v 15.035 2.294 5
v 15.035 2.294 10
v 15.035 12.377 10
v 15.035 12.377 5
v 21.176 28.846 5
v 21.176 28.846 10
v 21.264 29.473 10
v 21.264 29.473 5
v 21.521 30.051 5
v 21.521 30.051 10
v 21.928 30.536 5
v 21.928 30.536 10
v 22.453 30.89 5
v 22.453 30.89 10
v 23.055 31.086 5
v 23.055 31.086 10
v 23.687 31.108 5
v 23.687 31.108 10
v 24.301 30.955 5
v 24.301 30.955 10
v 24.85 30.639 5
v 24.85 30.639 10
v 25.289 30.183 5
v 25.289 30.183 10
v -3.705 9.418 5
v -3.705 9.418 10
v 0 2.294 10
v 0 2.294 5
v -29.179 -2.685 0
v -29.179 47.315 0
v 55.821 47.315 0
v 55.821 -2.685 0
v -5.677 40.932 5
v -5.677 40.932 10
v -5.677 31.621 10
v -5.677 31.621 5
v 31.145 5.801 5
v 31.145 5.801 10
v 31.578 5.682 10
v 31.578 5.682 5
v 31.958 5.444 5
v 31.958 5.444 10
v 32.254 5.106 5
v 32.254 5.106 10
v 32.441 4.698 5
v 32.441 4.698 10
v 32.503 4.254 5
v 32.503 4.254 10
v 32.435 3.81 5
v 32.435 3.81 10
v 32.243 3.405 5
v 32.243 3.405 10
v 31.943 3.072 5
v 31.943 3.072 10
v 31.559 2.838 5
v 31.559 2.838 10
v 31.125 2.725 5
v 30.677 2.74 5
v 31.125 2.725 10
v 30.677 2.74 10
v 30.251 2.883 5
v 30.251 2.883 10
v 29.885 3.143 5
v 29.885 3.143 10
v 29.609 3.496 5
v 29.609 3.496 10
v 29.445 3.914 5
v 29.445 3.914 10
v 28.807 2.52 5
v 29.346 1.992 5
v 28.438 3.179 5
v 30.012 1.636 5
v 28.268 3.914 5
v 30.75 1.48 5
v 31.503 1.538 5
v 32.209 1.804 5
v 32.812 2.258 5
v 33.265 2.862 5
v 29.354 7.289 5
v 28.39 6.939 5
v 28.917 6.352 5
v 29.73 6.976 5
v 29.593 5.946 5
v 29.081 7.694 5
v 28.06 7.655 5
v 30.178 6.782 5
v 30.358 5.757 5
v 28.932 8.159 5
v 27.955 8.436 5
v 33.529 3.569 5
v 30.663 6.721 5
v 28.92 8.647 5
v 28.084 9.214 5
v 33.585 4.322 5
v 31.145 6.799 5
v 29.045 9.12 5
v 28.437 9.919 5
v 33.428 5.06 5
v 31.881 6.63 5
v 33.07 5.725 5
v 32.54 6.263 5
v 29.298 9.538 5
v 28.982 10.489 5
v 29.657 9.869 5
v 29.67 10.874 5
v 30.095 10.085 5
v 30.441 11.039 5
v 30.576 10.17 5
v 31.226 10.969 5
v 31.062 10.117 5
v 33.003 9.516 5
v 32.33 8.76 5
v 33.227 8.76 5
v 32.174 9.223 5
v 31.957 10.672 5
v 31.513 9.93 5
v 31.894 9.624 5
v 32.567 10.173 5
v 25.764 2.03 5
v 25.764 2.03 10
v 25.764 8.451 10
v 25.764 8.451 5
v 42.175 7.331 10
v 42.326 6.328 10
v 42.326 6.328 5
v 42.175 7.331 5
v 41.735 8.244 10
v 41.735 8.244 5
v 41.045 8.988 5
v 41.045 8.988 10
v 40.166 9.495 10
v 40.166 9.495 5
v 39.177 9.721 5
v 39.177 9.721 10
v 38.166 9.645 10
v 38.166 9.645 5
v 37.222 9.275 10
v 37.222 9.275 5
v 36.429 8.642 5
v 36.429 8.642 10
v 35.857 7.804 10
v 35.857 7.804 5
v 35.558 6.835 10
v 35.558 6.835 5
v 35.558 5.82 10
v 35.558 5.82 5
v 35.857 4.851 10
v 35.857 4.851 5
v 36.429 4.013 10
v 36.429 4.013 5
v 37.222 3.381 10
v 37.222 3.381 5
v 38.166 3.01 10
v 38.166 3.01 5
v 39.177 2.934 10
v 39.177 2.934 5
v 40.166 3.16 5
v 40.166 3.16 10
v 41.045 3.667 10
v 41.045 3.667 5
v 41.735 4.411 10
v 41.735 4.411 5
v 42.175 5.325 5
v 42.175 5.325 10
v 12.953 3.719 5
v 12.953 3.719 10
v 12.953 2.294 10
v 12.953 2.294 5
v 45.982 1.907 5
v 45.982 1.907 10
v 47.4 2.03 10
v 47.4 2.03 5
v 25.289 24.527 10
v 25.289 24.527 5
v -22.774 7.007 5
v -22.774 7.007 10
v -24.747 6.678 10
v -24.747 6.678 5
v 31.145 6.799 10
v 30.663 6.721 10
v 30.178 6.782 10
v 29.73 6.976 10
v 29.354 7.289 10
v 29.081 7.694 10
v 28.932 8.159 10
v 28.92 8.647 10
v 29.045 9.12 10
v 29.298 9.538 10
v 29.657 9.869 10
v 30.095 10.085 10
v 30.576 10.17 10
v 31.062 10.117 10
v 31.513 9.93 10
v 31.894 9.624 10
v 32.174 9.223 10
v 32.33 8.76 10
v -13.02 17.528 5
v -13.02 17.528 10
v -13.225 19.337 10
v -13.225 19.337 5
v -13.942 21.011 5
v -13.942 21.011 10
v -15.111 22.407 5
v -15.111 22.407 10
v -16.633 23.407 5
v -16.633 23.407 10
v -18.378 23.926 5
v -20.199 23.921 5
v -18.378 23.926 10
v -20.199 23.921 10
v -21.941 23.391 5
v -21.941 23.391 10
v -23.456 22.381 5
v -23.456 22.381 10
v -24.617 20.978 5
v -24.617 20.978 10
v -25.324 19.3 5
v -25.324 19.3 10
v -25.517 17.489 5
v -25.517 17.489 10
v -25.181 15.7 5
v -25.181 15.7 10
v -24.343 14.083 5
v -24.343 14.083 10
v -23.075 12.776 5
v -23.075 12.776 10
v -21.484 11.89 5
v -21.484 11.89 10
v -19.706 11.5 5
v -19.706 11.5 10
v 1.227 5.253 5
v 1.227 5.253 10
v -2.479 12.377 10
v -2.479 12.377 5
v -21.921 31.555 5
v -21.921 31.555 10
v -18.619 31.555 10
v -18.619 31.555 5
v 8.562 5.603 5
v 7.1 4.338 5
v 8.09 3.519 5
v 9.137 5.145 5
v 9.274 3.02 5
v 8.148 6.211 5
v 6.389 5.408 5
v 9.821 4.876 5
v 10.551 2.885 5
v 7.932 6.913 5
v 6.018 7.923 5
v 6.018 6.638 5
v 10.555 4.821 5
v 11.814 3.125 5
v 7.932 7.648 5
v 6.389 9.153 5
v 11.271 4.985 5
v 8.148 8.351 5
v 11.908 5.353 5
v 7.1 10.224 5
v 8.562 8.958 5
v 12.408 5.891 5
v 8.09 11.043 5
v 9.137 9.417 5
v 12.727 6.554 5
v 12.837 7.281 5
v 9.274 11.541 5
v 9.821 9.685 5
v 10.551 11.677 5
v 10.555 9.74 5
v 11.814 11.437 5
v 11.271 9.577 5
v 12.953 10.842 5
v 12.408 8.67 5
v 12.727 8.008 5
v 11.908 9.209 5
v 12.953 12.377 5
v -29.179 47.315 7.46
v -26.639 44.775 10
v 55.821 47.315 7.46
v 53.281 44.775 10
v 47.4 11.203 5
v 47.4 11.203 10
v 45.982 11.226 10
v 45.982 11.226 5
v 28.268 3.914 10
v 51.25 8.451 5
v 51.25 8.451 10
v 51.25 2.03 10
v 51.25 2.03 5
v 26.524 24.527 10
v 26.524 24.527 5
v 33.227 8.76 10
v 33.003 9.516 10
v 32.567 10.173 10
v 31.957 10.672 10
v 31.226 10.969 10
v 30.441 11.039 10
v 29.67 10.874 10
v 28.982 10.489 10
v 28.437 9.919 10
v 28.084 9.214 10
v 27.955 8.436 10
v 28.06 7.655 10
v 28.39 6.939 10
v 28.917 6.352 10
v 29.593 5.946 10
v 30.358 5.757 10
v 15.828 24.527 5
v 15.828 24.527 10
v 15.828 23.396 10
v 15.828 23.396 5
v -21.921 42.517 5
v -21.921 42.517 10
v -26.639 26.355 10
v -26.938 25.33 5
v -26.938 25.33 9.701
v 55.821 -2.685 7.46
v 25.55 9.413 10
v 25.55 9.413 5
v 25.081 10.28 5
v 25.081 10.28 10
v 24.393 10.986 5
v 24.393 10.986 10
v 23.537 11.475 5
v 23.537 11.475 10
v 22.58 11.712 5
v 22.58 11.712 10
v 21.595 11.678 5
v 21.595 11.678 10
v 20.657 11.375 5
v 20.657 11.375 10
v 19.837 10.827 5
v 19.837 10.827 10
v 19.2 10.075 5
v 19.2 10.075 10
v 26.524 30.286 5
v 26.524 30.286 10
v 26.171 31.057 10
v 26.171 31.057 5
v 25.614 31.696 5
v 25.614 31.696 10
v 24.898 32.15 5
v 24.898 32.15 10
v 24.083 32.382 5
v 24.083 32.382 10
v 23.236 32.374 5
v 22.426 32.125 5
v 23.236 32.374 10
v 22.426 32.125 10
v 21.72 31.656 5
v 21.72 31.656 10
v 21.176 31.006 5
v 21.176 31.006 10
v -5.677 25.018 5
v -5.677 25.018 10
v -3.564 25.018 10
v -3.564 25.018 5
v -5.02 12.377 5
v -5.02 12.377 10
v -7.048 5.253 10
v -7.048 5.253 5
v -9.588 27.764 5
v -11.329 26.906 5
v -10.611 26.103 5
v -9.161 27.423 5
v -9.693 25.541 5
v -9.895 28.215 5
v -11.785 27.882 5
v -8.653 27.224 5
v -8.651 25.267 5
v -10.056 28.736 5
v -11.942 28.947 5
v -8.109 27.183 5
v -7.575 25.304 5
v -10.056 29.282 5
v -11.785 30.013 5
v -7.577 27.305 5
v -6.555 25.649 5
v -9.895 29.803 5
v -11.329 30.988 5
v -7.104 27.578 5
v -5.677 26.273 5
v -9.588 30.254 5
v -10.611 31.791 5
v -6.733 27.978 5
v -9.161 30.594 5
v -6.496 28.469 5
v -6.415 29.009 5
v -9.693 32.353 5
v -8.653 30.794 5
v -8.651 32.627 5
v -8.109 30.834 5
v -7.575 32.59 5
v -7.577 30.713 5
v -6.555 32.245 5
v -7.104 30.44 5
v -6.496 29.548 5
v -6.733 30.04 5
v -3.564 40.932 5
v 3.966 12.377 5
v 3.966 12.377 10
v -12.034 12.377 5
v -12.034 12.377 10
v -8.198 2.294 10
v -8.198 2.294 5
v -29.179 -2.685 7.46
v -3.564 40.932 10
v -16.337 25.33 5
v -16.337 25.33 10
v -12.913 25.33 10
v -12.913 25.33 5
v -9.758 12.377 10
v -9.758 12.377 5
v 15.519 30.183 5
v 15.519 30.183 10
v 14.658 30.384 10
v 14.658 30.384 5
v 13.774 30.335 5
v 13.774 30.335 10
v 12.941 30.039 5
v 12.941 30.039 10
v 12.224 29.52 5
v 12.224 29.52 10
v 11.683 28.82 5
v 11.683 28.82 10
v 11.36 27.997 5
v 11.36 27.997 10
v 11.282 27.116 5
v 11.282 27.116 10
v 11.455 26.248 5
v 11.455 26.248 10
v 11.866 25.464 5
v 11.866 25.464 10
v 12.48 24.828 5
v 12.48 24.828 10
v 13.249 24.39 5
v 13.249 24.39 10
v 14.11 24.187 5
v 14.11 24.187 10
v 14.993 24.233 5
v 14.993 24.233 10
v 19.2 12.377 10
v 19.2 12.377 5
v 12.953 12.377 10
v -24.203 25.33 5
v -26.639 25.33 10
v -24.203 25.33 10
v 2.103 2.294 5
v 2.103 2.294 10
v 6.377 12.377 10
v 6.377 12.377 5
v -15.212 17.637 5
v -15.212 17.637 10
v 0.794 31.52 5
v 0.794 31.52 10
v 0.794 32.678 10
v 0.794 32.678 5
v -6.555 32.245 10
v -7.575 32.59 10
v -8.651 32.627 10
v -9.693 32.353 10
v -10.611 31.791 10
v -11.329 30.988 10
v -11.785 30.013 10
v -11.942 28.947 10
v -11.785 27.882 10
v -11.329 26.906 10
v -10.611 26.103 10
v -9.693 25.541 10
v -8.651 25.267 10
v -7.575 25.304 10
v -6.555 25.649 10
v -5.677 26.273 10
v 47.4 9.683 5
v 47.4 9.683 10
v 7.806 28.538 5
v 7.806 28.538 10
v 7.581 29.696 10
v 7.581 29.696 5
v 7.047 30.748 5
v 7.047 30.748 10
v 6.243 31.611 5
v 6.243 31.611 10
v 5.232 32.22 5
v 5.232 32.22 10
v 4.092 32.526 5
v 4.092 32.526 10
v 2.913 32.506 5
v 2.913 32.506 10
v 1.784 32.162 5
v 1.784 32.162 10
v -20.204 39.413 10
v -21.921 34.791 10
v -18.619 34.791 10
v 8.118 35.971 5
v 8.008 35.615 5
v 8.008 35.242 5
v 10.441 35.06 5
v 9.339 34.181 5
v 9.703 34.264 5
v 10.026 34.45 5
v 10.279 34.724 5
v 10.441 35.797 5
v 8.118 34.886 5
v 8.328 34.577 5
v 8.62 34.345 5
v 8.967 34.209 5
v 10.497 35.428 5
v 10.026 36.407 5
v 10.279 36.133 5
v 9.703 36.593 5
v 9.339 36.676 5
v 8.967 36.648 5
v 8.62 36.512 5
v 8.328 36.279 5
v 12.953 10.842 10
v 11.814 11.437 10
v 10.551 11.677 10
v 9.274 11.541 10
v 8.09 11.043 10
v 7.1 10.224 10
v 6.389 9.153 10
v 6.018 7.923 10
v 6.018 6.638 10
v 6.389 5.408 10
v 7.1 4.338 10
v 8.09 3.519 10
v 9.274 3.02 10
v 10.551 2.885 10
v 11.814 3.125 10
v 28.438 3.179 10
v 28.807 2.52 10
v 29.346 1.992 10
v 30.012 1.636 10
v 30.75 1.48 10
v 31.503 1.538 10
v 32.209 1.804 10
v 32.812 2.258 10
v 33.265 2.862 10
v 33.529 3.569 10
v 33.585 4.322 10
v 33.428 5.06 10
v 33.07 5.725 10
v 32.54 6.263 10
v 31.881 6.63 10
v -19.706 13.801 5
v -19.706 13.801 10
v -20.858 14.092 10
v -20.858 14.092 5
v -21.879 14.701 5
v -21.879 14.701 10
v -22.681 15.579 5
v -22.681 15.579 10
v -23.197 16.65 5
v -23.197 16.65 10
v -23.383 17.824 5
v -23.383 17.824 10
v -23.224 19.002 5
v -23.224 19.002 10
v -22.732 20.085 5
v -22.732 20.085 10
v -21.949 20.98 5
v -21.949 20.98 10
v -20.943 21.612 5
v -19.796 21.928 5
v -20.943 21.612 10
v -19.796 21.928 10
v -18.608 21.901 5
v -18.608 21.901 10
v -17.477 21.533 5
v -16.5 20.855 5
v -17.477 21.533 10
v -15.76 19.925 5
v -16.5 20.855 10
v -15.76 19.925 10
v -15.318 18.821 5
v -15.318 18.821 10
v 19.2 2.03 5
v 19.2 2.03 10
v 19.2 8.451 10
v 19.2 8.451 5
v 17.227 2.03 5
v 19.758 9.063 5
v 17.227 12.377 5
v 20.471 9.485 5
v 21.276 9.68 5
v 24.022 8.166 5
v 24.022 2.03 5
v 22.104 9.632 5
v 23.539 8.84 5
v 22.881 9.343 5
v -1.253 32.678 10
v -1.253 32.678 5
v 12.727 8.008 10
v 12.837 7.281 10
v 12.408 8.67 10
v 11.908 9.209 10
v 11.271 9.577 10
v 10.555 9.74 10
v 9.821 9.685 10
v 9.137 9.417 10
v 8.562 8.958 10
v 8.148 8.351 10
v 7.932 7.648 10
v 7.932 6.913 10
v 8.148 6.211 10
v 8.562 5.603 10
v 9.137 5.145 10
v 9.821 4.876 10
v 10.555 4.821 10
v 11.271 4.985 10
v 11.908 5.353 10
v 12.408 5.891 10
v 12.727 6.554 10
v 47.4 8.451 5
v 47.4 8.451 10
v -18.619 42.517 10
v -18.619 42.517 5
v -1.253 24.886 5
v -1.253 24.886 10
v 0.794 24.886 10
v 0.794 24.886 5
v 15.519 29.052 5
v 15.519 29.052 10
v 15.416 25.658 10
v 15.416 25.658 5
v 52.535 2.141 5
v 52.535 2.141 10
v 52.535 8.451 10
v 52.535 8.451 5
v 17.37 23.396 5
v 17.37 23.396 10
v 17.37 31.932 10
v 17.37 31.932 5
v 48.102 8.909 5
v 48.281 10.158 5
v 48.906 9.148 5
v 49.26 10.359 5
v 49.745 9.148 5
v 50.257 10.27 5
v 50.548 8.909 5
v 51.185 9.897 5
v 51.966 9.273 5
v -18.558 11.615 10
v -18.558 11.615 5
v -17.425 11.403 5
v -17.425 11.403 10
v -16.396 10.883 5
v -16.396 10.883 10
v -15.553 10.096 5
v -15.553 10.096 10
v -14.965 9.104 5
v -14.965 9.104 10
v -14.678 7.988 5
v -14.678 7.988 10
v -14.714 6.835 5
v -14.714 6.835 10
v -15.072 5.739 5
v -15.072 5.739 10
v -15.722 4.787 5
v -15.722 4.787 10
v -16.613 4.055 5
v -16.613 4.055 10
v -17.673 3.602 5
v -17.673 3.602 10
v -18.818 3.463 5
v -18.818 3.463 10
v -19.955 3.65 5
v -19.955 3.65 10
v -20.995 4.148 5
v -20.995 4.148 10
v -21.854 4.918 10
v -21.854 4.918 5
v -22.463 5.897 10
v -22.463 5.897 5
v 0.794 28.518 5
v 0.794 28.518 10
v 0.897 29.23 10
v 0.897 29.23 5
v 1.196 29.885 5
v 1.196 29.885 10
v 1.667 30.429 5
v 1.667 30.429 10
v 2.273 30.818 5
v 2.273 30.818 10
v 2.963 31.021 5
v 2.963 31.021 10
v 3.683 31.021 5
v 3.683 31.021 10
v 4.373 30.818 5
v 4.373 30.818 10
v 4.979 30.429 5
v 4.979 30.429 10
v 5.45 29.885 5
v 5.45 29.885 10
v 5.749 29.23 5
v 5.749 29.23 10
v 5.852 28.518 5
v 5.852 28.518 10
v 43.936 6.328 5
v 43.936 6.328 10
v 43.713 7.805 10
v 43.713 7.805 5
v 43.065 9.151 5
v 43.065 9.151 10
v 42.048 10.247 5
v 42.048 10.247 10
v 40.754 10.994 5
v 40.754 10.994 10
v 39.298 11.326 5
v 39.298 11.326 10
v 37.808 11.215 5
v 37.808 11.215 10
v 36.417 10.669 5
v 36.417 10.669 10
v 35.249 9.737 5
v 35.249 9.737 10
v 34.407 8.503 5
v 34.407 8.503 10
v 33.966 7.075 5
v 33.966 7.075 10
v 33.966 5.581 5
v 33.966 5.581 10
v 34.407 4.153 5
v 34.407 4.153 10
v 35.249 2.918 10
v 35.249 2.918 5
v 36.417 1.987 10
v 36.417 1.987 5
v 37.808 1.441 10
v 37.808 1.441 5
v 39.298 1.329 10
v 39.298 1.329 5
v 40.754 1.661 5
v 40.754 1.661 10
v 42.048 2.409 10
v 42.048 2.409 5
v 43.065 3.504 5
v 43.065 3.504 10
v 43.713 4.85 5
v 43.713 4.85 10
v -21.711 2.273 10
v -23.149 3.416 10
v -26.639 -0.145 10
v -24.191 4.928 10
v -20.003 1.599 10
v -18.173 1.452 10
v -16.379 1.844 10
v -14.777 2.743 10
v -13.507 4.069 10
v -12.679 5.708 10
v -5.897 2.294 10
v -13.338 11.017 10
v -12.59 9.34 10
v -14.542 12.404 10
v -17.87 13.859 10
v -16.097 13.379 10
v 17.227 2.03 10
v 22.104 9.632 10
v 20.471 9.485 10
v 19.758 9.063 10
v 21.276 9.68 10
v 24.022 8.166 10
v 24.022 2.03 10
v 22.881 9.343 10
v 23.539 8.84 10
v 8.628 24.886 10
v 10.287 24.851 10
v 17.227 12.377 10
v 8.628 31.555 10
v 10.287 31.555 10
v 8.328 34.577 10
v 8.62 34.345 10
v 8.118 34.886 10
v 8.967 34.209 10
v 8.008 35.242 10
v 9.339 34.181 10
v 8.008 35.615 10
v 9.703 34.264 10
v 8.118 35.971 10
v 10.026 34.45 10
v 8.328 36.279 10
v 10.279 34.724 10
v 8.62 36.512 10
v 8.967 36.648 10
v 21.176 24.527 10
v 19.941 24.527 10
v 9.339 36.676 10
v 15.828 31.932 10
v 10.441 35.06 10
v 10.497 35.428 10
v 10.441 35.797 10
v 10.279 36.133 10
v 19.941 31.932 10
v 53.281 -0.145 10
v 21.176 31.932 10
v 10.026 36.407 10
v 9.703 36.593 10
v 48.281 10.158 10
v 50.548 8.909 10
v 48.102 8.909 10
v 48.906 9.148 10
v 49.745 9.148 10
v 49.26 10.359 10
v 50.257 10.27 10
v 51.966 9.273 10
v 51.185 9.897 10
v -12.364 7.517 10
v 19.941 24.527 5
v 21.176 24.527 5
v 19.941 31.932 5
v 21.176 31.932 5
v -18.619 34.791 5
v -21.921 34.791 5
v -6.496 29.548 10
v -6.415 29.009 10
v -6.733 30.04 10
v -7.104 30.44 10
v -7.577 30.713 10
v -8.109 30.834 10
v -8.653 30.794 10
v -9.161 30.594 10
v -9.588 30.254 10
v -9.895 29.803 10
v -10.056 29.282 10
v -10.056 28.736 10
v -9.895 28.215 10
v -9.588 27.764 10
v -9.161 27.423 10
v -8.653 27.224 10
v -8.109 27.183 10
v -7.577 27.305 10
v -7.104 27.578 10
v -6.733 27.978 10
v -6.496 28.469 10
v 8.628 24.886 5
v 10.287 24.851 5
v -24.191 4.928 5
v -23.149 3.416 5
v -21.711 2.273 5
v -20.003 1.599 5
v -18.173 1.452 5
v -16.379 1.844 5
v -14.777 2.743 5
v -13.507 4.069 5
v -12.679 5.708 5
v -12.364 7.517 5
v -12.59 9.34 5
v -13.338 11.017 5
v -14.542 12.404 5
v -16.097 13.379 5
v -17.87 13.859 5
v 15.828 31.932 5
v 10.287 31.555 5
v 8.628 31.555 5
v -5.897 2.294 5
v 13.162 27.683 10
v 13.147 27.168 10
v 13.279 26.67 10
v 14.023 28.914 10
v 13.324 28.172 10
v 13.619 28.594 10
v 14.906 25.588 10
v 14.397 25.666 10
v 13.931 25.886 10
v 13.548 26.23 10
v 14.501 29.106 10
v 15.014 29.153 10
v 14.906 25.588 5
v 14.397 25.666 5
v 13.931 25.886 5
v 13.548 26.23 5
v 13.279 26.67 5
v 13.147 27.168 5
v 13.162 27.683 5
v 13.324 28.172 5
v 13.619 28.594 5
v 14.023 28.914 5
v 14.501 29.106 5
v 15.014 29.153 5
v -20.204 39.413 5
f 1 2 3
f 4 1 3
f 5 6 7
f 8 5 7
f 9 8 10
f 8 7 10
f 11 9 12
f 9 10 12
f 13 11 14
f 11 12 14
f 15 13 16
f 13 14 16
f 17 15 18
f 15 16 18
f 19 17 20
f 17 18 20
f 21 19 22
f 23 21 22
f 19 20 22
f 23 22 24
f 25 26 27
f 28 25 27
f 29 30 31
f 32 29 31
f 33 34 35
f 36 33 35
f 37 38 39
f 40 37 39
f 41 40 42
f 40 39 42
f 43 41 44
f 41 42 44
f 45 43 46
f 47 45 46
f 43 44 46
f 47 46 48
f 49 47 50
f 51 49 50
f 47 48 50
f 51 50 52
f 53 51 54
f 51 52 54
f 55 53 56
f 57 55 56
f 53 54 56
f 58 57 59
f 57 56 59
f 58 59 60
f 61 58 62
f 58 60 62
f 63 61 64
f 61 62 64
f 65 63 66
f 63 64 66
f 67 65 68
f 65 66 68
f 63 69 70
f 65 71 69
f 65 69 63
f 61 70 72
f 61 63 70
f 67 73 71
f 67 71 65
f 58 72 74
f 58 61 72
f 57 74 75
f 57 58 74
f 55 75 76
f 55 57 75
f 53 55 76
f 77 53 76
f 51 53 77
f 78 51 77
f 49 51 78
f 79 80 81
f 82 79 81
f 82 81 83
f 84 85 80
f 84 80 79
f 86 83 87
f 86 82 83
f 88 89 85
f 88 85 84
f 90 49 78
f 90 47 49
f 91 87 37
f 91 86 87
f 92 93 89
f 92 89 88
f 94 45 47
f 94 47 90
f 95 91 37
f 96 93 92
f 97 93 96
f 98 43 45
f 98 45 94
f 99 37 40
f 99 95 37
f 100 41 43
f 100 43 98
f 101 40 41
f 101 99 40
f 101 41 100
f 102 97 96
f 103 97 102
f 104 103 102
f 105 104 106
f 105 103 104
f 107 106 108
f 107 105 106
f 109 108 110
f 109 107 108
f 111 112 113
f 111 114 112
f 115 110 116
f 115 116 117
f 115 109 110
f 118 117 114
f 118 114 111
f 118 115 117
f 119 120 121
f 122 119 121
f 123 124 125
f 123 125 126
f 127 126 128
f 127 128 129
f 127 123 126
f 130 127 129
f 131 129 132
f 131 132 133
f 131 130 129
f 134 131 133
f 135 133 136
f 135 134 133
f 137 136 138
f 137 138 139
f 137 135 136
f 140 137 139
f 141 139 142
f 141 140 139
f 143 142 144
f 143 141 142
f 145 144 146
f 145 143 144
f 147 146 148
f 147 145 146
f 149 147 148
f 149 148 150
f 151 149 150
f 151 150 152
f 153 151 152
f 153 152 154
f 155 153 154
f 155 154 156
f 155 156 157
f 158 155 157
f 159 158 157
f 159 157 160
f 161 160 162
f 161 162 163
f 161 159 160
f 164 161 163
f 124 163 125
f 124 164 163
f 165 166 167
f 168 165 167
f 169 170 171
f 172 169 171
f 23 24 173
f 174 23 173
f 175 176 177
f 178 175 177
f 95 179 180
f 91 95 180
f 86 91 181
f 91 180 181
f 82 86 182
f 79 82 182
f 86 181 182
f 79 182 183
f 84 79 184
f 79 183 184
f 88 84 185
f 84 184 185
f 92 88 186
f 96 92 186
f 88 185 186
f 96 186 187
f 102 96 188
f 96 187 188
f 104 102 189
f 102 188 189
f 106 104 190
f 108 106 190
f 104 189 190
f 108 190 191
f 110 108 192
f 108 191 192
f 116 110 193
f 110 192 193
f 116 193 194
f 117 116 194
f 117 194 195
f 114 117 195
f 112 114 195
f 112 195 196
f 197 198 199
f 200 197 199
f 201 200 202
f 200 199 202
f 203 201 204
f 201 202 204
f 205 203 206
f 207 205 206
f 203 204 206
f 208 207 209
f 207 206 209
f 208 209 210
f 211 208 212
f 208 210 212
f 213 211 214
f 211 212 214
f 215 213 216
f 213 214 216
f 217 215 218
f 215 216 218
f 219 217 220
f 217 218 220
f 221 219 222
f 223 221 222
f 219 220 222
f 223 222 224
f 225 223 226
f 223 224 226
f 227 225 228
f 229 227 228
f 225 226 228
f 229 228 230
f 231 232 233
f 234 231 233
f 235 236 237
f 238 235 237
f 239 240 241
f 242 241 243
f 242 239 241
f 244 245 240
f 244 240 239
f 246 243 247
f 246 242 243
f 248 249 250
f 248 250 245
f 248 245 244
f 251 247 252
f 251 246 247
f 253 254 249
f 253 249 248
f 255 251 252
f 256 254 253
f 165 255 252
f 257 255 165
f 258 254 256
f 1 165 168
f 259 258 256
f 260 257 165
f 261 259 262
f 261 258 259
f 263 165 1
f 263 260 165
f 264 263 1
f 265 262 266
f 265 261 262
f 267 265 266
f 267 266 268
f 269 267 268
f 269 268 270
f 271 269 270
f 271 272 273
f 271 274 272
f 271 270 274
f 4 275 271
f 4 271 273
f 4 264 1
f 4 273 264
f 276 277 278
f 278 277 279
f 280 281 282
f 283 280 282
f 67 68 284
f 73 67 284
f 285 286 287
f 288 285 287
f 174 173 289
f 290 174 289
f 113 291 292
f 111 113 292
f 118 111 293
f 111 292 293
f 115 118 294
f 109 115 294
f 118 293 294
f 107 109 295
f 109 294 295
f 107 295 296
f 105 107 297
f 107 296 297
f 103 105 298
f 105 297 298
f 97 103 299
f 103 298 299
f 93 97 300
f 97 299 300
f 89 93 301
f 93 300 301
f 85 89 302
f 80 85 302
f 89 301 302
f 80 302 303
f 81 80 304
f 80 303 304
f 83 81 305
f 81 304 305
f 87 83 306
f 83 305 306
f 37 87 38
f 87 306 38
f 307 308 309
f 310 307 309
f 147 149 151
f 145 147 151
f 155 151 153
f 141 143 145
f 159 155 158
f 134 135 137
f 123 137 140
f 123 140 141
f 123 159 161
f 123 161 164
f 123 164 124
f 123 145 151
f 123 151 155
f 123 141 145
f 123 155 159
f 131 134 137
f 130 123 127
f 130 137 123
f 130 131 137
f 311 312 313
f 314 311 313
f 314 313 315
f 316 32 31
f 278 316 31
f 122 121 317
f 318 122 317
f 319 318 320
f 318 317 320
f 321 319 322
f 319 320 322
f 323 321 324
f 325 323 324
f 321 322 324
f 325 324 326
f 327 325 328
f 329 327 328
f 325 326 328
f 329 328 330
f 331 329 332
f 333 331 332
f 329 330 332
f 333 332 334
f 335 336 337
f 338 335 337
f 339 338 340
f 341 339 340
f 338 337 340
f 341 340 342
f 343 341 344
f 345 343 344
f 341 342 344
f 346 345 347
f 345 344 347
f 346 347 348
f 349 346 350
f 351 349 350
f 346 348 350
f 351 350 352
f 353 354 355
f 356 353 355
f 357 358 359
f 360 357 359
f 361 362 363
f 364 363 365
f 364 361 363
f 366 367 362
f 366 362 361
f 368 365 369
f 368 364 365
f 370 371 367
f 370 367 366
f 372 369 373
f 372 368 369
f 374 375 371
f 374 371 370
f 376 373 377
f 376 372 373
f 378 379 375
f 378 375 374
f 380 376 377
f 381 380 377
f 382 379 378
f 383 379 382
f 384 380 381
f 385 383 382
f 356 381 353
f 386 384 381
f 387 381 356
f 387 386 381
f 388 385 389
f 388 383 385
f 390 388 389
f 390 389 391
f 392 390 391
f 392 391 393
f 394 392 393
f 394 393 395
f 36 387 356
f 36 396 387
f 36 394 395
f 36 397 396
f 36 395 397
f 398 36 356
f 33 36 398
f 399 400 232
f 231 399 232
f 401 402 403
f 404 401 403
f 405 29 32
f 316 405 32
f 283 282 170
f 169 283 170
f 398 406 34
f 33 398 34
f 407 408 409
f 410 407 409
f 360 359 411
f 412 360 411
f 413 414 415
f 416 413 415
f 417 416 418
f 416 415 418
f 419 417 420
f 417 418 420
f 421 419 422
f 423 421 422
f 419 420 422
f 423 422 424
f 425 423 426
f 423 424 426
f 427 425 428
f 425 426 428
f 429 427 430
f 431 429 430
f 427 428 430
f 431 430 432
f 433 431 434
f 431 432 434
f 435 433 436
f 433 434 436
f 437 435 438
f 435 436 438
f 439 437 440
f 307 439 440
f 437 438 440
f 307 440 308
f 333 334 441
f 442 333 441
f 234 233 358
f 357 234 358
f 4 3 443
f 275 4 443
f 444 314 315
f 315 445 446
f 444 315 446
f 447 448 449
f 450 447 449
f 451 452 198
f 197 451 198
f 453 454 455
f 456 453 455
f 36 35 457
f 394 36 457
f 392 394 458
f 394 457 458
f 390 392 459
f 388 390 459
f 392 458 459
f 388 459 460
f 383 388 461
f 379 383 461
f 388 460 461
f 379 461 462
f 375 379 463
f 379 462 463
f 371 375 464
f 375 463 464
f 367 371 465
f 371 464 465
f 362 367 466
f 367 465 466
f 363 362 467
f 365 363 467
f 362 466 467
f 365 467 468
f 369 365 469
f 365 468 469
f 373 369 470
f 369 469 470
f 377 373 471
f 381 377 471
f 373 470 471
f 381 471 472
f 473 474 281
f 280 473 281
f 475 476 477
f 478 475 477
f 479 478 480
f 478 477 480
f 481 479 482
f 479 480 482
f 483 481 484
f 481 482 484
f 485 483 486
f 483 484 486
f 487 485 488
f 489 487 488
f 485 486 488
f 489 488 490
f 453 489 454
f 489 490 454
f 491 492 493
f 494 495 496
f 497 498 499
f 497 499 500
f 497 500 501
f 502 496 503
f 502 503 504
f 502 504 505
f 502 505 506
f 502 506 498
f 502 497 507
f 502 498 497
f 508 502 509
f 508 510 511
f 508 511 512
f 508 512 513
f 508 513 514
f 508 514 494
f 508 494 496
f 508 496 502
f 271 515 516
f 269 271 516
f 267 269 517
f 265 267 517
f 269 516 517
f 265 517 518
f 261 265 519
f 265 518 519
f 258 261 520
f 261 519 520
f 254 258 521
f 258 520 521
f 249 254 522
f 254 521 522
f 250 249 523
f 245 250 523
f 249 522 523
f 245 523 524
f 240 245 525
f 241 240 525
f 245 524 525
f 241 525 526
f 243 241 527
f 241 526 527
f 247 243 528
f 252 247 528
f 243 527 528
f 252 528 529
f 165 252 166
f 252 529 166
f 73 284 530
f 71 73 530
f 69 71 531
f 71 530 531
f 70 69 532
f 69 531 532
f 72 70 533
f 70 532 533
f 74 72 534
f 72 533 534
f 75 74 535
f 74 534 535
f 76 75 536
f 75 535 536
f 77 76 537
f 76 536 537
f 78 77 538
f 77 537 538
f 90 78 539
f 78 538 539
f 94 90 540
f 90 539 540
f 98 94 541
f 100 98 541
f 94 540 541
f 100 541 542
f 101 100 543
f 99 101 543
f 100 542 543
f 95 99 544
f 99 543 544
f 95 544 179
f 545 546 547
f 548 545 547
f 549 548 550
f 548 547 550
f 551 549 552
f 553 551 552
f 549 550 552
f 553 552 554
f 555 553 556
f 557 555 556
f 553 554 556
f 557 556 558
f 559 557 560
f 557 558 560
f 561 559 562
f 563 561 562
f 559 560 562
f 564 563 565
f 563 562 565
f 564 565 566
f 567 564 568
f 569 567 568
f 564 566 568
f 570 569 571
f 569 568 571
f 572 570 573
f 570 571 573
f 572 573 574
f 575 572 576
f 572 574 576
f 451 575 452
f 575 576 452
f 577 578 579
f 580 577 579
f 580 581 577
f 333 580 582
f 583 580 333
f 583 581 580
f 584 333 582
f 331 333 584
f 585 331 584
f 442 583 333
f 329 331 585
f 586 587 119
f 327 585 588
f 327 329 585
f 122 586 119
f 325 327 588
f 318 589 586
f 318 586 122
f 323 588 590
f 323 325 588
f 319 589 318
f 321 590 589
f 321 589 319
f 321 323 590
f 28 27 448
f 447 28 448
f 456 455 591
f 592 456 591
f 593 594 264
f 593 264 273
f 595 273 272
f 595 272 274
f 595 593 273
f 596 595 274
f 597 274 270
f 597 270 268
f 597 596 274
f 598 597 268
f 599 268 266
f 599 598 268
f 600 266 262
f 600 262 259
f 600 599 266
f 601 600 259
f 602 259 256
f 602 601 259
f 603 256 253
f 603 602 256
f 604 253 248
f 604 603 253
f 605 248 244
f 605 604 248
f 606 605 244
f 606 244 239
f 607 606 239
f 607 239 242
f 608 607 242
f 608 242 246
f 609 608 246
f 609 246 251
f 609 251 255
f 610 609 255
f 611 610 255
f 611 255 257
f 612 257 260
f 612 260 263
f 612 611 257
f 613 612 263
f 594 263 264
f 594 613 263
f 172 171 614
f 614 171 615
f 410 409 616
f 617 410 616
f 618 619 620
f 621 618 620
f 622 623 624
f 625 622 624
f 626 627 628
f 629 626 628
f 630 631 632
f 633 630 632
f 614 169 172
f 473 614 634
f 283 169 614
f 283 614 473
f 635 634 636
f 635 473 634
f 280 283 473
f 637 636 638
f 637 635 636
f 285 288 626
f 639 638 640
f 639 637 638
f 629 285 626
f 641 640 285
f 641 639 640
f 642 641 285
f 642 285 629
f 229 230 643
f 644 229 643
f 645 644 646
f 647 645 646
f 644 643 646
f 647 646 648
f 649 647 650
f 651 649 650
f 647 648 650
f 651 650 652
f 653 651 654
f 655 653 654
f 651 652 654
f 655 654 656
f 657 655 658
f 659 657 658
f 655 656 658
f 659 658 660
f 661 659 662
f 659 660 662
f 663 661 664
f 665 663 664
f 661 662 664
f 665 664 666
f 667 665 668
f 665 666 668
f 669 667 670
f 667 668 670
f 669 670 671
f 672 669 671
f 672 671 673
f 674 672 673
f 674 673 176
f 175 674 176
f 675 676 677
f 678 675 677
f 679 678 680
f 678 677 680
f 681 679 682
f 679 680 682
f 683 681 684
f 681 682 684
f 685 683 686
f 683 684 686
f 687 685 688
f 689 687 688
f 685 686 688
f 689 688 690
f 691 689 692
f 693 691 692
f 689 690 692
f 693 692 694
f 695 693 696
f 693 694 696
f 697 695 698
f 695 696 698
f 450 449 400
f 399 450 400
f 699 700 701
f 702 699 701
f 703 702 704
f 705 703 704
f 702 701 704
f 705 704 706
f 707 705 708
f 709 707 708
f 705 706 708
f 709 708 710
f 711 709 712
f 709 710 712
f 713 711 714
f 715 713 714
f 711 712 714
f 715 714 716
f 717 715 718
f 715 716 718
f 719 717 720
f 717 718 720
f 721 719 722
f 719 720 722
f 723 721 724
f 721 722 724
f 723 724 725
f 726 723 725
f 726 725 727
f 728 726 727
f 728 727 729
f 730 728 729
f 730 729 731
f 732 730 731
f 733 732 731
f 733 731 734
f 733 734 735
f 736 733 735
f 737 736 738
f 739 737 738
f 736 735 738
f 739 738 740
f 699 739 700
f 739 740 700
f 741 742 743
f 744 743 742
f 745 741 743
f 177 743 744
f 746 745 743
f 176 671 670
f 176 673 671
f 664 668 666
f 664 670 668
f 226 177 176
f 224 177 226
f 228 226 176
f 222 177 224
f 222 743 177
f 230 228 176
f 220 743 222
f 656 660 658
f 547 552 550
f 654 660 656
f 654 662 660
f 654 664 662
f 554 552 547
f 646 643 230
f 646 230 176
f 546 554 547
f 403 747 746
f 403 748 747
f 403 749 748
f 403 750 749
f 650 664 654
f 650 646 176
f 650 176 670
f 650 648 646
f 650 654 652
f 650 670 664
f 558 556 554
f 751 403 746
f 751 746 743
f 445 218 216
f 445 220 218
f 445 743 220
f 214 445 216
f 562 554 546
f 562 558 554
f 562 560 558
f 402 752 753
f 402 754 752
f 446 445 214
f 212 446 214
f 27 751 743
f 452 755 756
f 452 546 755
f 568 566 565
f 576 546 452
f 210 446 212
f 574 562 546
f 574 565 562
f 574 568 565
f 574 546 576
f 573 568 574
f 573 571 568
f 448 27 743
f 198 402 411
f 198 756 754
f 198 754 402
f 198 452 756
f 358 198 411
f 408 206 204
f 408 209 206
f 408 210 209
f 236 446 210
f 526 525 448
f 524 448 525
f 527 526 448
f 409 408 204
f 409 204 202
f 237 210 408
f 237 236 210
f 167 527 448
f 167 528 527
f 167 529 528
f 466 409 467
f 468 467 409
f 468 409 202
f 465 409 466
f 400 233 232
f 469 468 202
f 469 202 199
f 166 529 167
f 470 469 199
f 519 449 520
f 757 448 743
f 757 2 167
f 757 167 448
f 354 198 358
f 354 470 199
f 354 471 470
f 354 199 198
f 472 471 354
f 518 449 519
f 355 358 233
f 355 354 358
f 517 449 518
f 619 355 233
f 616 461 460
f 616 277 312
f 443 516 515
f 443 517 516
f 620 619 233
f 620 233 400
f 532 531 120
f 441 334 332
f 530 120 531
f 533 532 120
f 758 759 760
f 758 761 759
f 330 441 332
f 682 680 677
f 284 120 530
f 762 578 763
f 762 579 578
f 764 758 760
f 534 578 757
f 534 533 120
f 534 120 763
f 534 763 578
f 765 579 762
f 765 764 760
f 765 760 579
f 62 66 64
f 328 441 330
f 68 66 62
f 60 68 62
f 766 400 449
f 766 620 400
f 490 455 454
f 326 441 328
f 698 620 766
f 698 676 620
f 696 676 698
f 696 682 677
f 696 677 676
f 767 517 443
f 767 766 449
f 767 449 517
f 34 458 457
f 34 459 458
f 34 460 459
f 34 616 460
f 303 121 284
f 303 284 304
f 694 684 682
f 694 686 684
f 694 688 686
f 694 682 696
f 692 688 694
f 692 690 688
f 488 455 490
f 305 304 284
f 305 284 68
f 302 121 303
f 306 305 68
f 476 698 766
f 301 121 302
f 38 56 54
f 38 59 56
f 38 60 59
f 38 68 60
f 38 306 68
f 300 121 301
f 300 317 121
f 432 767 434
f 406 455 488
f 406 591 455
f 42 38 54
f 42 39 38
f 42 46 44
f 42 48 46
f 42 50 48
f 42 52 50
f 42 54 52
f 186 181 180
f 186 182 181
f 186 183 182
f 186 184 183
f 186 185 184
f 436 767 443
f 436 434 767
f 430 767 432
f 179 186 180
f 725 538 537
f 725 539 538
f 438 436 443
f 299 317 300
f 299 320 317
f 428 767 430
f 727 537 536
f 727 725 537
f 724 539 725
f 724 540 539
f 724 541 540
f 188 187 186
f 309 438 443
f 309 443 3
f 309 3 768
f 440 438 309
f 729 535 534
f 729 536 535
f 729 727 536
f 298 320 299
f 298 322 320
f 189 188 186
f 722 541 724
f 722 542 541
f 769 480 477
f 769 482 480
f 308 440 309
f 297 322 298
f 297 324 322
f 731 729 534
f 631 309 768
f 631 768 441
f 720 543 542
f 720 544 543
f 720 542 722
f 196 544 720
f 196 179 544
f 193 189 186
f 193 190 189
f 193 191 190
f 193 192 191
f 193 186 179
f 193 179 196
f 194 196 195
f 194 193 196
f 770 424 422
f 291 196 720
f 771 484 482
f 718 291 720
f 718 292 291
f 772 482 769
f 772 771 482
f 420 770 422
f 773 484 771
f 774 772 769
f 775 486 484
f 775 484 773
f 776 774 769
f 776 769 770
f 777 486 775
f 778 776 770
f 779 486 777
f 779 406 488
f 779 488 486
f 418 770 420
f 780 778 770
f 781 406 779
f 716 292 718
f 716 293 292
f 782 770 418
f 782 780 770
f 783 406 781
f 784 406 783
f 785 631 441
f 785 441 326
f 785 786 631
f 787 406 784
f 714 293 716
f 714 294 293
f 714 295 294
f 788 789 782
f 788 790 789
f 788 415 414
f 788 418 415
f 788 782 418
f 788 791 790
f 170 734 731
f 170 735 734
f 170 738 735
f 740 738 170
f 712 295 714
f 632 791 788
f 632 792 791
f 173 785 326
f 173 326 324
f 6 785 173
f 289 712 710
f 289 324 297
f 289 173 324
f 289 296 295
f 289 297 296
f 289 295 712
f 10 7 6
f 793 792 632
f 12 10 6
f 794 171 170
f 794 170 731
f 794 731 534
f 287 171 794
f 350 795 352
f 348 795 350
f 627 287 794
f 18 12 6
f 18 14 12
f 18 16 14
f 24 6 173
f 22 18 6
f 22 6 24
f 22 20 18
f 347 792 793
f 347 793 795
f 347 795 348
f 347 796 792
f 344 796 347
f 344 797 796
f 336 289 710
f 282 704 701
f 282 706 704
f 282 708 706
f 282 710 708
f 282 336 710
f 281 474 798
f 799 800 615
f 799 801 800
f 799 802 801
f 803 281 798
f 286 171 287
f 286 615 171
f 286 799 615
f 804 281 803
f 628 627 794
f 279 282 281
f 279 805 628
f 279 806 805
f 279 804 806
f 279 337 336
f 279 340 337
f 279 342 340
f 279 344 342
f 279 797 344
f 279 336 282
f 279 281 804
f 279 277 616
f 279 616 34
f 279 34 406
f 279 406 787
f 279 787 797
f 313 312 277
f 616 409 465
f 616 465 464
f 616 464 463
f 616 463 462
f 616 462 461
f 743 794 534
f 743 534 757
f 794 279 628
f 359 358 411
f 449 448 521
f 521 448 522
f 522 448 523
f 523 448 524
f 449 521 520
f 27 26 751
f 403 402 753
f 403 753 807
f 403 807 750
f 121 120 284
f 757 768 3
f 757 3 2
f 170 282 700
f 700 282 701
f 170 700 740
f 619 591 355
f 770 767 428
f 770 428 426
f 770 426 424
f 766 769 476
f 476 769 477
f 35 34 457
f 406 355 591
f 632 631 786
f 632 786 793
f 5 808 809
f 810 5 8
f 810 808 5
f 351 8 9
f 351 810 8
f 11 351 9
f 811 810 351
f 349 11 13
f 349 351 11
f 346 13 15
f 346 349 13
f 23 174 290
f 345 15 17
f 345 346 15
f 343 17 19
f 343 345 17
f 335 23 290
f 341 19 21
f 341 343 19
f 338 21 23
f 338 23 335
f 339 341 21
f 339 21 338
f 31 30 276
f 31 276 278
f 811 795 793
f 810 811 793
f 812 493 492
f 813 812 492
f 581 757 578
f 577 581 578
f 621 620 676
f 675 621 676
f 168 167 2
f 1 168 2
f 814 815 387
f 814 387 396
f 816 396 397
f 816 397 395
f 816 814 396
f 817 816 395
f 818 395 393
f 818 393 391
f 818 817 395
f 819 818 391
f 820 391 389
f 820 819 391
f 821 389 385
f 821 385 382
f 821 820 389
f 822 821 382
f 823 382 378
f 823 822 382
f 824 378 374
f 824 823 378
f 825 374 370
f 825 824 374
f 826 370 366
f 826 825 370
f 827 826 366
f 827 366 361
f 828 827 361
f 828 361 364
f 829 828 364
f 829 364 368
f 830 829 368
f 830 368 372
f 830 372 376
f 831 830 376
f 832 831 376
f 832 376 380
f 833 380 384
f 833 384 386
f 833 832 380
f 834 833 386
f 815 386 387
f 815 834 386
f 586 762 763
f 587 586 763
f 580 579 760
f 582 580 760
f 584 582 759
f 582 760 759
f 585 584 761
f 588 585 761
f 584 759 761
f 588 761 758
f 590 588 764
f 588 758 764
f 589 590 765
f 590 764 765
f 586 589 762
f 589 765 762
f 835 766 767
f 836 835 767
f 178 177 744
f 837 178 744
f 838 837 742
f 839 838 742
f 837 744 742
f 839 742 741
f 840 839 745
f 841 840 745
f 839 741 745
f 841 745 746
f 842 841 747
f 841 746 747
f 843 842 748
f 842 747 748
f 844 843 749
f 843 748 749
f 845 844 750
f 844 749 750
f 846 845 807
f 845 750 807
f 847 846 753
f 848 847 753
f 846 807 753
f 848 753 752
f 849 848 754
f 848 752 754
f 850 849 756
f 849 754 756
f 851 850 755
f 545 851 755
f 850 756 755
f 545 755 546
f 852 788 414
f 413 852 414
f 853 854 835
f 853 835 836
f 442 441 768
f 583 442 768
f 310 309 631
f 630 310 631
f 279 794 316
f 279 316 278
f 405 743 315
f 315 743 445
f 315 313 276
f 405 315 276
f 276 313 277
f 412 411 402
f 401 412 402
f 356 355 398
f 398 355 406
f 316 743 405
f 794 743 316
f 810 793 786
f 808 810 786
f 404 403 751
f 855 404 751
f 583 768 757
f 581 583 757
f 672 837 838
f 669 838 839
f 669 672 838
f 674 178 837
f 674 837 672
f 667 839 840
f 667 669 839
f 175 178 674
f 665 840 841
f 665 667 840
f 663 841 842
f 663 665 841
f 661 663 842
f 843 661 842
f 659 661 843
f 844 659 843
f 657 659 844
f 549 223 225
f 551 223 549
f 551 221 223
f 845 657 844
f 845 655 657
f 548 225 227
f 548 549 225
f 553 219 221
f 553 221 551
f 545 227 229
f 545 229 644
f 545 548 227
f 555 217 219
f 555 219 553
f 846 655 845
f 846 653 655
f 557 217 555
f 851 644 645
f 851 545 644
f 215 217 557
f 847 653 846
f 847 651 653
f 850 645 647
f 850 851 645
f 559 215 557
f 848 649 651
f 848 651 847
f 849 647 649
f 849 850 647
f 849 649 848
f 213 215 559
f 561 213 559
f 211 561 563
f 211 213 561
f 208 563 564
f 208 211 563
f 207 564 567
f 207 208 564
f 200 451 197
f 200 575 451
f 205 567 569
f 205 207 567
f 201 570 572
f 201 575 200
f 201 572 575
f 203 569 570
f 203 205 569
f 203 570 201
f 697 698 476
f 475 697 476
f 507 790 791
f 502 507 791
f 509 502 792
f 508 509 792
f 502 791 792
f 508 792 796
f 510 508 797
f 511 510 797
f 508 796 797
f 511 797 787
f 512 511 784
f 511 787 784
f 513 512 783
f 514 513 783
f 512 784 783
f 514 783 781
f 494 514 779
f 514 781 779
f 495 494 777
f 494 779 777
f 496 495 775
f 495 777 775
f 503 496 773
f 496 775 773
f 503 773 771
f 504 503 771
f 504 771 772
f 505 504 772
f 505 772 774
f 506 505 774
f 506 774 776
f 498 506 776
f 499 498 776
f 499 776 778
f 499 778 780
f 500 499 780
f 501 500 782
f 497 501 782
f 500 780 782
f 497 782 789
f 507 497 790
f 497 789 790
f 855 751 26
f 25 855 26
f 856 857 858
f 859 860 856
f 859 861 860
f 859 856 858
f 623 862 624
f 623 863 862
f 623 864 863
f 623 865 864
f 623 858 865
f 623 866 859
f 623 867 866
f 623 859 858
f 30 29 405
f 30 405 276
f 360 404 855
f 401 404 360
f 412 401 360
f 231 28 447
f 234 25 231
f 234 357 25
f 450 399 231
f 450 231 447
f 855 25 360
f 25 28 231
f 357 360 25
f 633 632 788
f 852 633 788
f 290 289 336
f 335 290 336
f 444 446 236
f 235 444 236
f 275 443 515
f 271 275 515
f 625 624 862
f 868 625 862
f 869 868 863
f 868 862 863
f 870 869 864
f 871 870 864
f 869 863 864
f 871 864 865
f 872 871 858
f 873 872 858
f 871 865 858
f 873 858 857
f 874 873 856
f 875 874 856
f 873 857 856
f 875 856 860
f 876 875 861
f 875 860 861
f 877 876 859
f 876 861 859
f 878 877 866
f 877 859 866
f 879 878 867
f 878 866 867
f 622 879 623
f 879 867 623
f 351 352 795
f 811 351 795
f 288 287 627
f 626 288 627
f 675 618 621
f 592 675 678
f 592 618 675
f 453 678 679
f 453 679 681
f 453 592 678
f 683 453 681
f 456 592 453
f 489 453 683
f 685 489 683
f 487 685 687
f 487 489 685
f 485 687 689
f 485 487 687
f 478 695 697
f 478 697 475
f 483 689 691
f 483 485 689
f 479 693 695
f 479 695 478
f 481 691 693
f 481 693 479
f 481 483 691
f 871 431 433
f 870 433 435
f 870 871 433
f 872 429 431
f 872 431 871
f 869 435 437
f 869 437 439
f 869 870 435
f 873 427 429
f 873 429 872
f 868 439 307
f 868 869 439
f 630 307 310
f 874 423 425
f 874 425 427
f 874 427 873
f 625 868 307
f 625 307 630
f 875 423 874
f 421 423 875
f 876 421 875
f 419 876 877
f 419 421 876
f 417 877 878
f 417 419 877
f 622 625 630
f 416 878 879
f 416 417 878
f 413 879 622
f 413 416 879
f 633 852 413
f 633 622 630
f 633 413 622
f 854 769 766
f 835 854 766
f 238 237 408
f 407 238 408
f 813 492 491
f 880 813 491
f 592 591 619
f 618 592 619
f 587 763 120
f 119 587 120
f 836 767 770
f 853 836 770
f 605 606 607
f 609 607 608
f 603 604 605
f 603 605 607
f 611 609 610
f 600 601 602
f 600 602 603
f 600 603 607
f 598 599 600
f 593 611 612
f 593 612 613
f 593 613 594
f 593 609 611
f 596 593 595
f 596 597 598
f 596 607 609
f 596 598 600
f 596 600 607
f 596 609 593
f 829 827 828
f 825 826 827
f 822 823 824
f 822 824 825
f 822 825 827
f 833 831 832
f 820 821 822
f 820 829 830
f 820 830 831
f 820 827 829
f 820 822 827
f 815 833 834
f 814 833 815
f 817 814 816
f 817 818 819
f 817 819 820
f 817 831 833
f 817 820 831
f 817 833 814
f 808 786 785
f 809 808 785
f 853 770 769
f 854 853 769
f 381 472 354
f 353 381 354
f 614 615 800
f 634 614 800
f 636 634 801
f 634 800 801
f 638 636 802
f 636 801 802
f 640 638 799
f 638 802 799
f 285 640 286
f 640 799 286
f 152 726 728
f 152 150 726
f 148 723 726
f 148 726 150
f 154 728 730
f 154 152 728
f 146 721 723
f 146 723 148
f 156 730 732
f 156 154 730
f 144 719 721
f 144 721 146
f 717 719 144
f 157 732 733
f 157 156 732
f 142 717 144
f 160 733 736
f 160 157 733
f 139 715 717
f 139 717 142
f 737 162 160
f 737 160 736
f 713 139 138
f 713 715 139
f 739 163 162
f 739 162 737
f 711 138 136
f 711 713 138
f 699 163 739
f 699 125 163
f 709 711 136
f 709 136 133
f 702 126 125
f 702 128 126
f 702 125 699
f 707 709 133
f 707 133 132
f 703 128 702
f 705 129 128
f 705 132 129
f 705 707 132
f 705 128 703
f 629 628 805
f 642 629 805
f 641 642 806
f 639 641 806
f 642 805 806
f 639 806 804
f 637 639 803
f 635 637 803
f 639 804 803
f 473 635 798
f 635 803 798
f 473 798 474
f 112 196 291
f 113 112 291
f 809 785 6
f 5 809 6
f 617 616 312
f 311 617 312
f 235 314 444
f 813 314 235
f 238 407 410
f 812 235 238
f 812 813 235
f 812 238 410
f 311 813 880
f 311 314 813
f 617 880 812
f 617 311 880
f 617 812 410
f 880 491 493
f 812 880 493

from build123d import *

# Parameters (mm, degrees)
F0_W     = 85
F0_H     = 50
F1_DEPTH = 10
F4_SIZE  = 2.54
F2_R     = 1.830609
F2_R_2   = 1.251164
F3_R     = 2.466277
F3_R_2   = 5.012631
F3_R_3   = 3.402789
F5_DEPTH = 5


with BuildPart() as f1:
    # F0 (on Top) → F1 (new body)
    with BuildSketch(Plane.XY):
        with Locations((13.320725, 22.314699)):
            Rectangle(F0_W, F0_H)
    extrude(amount=F1_DEPTH)

    # F4
    f4_edges = [f1.edges().sort_by_distance(p)[0] for p in [
        (13.320725, 47.314699, 10),
        (-29.179275, 22.314699, 10),
        (13.320725, -2.685301, 10),
        (55.820725, 22.314699, 10),
    ]]
    chamfer(f4_edges, length=F4_SIZE)

    # F2 (on face) + F3 (on face) → F5 (cut)
    with BuildSketch(Plane.XY.offset(10)):
        Polygon((-21.920681, 42.516656), (-26.938394, 25.330184), (-24.203247, 25.330184), (-21.920681, 31.555358), (-18.619085, 31.555358), (-16.336523, 25.330184), (-12.91264, 25.330184), (-18.619085, 42.516656), align=None)
        Polygon((-20.203851, 39.413154), (-18.619085, 34.790922), (-21.920681, 34.790922), align=None, mode=Mode.SUBTRACT)
        with BuildLine():
            ThreePointArc((-5.676832, 31.621389), (-11.941997, 28.947097), (-5.676832, 26.272805))
            Line((-5.676832, 26.272805), (-5.676832, 25.018198))
            Line((-5.676832, 25.018198), (-3.56381, 25.018198))
            Line((-3.56381, 25.018198), (-3.56381, 40.931888))
            Line((-3.56381, 40.931888), (-5.676832, 40.931888))
            Line((-5.676832, 40.931888), (-5.676832, 31.621389))
        make_face()
        with Locations((-8.245731, 29.008828)):
            Circle(F2_R, mode=Mode.SUBTRACT)
        with BuildLine():
            Line((-1.252693, 32.6779), (-1.252693, 24.886135))
            Line((-1.252693, 24.886135), (0.794296, 24.886135))
            Line((0.794296, 24.886135), (0.794296, 28.517889))
            ThreePointArc((0.794296, 28.517889), (3.322981, 31.046574), (5.851666, 28.517889))
            Line((5.851666, 28.517889), (7.805725, 28.537814))
            ThreePointArc((7.805725, 28.537814), (5.231823, 32.219617), (0.794296, 31.520326))
            Line((0.794296, 31.520326), (0.794296, 32.6779))
            Line((0.794296, 32.6779), (-1.252693, 32.6779))
        make_face()
        Polygon((10.287394, 31.555358), (8.628487, 31.555358), (8.628487, 24.886135), (10.287394, 24.851044), align=None)
        with Locations((9.245559, 35.428446)):
            Circle(F2_R_2)
        with BuildLine():
            Line((15.827652, 31.931706), (15.519116, 30.183338))
            ThreePointArc((15.519116, 30.183338), (11.282193, 27.115575), (15.827652, 24.526851))
            Line((15.827652, 24.526851), (15.827652, 23.395553))
            Line((15.827652, 23.395553), (17.37033, 23.395553))
            Line((17.37033, 23.395553), (17.37033, 31.931706))
            Line((17.37033, 31.931706), (15.827652, 31.931706))
        make_face()
        with BuildLine():
            ThreePointArc((15.416271, 25.658149), (13.135805, 27.425758), (15.519116, 29.05204))
            Line((15.519116, 29.05204), (15.416271, 25.658149))
        make_face(mode=Mode.SUBTRACT)
        with BuildLine():
            Line((21.175602, 31.931706), (19.94146, 31.931706))
            Line((19.94146, 31.931706), (19.94146, 24.526851))
            Line((19.94146, 24.526851), (21.175602, 24.526851))
            Line((21.175602, 24.526851), (21.175602, 28.84635))
            ThreePointArc((21.175602, 28.84635), (22.746854, 31.009158), (25.289411, 30.183338))
            Line((25.289411, 30.183338), (25.289411, 24.526851))
            Line((25.289411, 24.526851), (26.523555, 24.526851))
            Line((26.523555, 24.526851), (26.523555, 30.286184))
            ThreePointArc((26.523555, 30.286184), (24.083285, 32.382249), (21.175602, 31.0061))
            Line((21.175602, 31.0061), (21.175602, 31.931706))
        make_face()
    with BuildSketch(Plane.XY.offset(10)):
        with BuildLine():
            Line((-15.212267, 17.637189), (-13.020429, 17.527597))
            ThreePointArc((-13.020429, 17.527597), (-23.456448, 22.38112), (-19.705536, 11.500043))
            ThreePointArc((-19.705536, 11.500043), (-15.363439, 5.240268), (-22.77411, 7.006774))
            Line((-22.77411, 7.006774), (-24.746763, 6.677999))
            ThreePointArc((-24.746763, 6.677999), (-13.507007, 4.069267), (-19.705536, 13.801472))
            ThreePointArc((-19.705536, 13.801472), (-21.949485, 20.979729), (-15.212267, 17.637189))
        make_face()
        Polygon((-9.757687, 12.376778), (-12.034101, 12.376778), (-8.198384, 2.294322), (-5.896954, 2.294322), (-3.705117, 9.417796), (0, 2.294322), (2.103255, 2.294322), (6.377339, 12.376778), (3.966318, 12.376778), (1.226519, 5.253303), (-2.478598, 12.376778), (-5.020219, 12.376778), (-7.047669, 5.253303), align=None)
        with BuildLine():
            Line((15.0351, 2.294322), (15.0351, 12.376778))
            Line((15.0351, 12.376778), (12.952854, 12.376778))
            Line((12.952854, 12.376778), (12.952854, 10.842491))
            ThreePointArc((12.952854, 10.842491), (5.970738, 7.280754), (12.952854, 3.719016))
            Line((12.952854, 3.719016), (12.952854, 2.294322))
            Line((12.952854, 2.294322), (15.0351, 2.294322))
        make_face()
        with Locations((10.370258, 7.280754)):
            Circle(F3_R, mode=Mode.SUBTRACT)
        with BuildLine():
            Line((19.199593, 12.376778), (17.226938, 12.376778))
            Line((17.226938, 12.376778), (17.226938, 2.030088))
            Line((17.226938, 2.030088), (19.199593, 2.030088))
            Line((19.199593, 2.030088), (19.199593, 8.450842))
            ThreePointArc((19.199593, 8.450842), (21.691911, 9.686684), (24.021637, 8.166376))
            Line((24.021637, 8.166376), (24.021637, 2.030088))
            Line((24.021637, 2.030088), (25.764035, 2.030088))
            Line((25.764035, 2.030088), (25.764035, 8.450842))
            ThreePointArc((25.764035, 8.450842), (23.066805, 11.626978), (19.199593, 10.075347))
            Line((19.199593, 10.075347), (19.199593, 12.376778))
        make_face()
        with BuildLine():
            Line((32.3296, 8.760245), (33.227358, 8.760245))
            ThreePointArc((33.227358, 8.760245), (28.437176, 9.918983), (31.145109, 5.801263))
            ThreePointArc((31.145109, 5.801263), (32.104813, 3.227295), (29.444952, 3.913939))
            Line((29.444952, 3.913939), (28.267544, 3.913939))
            ThreePointArc((28.267544, 3.913939), (32.81246, 2.257757), (31.145109, 6.798588))
            ThreePointArc((31.145109, 6.798588), (29.156537, 9.33777), (32.3296, 8.760245))
        make_face()
        with Locations((38.923081, 6.327625)):
            Circle(F3_R_2)
        with Locations((38.923081, 6.327625)):
            Circle(F3_R_3, mode=Mode.SUBTRACT)
        with BuildLine():
            Line((45.981784, 1.907284), (47.400411, 2.030088))
            Line((47.400411, 2.030088), (47.400411, 8.450842))
            ThreePointArc((47.400411, 8.450842), (49.325353, 9.178813), (51.250294, 8.450842))
            Line((51.250294, 8.450842), (51.250294, 2.030088))
            Line((51.250294, 2.030088), (52.535262, 2.141321))
            Line((52.535262, 2.141321), (52.535262, 8.450842))
            ThreePointArc((52.535262, 8.450842), (50.256526, 10.269882), (47.400411, 9.683236))
            Line((47.400411, 9.683236), (47.400411, 11.202979))
            Line((47.400411, 11.202979), (45.981784, 11.226063))
            Line((45.981784, 11.226063), (45.981784, 1.907284))
        make_face()
    extrude(amount=-F5_DEPTH, mode=Mode.SUBTRACT)


solid = f1.part
